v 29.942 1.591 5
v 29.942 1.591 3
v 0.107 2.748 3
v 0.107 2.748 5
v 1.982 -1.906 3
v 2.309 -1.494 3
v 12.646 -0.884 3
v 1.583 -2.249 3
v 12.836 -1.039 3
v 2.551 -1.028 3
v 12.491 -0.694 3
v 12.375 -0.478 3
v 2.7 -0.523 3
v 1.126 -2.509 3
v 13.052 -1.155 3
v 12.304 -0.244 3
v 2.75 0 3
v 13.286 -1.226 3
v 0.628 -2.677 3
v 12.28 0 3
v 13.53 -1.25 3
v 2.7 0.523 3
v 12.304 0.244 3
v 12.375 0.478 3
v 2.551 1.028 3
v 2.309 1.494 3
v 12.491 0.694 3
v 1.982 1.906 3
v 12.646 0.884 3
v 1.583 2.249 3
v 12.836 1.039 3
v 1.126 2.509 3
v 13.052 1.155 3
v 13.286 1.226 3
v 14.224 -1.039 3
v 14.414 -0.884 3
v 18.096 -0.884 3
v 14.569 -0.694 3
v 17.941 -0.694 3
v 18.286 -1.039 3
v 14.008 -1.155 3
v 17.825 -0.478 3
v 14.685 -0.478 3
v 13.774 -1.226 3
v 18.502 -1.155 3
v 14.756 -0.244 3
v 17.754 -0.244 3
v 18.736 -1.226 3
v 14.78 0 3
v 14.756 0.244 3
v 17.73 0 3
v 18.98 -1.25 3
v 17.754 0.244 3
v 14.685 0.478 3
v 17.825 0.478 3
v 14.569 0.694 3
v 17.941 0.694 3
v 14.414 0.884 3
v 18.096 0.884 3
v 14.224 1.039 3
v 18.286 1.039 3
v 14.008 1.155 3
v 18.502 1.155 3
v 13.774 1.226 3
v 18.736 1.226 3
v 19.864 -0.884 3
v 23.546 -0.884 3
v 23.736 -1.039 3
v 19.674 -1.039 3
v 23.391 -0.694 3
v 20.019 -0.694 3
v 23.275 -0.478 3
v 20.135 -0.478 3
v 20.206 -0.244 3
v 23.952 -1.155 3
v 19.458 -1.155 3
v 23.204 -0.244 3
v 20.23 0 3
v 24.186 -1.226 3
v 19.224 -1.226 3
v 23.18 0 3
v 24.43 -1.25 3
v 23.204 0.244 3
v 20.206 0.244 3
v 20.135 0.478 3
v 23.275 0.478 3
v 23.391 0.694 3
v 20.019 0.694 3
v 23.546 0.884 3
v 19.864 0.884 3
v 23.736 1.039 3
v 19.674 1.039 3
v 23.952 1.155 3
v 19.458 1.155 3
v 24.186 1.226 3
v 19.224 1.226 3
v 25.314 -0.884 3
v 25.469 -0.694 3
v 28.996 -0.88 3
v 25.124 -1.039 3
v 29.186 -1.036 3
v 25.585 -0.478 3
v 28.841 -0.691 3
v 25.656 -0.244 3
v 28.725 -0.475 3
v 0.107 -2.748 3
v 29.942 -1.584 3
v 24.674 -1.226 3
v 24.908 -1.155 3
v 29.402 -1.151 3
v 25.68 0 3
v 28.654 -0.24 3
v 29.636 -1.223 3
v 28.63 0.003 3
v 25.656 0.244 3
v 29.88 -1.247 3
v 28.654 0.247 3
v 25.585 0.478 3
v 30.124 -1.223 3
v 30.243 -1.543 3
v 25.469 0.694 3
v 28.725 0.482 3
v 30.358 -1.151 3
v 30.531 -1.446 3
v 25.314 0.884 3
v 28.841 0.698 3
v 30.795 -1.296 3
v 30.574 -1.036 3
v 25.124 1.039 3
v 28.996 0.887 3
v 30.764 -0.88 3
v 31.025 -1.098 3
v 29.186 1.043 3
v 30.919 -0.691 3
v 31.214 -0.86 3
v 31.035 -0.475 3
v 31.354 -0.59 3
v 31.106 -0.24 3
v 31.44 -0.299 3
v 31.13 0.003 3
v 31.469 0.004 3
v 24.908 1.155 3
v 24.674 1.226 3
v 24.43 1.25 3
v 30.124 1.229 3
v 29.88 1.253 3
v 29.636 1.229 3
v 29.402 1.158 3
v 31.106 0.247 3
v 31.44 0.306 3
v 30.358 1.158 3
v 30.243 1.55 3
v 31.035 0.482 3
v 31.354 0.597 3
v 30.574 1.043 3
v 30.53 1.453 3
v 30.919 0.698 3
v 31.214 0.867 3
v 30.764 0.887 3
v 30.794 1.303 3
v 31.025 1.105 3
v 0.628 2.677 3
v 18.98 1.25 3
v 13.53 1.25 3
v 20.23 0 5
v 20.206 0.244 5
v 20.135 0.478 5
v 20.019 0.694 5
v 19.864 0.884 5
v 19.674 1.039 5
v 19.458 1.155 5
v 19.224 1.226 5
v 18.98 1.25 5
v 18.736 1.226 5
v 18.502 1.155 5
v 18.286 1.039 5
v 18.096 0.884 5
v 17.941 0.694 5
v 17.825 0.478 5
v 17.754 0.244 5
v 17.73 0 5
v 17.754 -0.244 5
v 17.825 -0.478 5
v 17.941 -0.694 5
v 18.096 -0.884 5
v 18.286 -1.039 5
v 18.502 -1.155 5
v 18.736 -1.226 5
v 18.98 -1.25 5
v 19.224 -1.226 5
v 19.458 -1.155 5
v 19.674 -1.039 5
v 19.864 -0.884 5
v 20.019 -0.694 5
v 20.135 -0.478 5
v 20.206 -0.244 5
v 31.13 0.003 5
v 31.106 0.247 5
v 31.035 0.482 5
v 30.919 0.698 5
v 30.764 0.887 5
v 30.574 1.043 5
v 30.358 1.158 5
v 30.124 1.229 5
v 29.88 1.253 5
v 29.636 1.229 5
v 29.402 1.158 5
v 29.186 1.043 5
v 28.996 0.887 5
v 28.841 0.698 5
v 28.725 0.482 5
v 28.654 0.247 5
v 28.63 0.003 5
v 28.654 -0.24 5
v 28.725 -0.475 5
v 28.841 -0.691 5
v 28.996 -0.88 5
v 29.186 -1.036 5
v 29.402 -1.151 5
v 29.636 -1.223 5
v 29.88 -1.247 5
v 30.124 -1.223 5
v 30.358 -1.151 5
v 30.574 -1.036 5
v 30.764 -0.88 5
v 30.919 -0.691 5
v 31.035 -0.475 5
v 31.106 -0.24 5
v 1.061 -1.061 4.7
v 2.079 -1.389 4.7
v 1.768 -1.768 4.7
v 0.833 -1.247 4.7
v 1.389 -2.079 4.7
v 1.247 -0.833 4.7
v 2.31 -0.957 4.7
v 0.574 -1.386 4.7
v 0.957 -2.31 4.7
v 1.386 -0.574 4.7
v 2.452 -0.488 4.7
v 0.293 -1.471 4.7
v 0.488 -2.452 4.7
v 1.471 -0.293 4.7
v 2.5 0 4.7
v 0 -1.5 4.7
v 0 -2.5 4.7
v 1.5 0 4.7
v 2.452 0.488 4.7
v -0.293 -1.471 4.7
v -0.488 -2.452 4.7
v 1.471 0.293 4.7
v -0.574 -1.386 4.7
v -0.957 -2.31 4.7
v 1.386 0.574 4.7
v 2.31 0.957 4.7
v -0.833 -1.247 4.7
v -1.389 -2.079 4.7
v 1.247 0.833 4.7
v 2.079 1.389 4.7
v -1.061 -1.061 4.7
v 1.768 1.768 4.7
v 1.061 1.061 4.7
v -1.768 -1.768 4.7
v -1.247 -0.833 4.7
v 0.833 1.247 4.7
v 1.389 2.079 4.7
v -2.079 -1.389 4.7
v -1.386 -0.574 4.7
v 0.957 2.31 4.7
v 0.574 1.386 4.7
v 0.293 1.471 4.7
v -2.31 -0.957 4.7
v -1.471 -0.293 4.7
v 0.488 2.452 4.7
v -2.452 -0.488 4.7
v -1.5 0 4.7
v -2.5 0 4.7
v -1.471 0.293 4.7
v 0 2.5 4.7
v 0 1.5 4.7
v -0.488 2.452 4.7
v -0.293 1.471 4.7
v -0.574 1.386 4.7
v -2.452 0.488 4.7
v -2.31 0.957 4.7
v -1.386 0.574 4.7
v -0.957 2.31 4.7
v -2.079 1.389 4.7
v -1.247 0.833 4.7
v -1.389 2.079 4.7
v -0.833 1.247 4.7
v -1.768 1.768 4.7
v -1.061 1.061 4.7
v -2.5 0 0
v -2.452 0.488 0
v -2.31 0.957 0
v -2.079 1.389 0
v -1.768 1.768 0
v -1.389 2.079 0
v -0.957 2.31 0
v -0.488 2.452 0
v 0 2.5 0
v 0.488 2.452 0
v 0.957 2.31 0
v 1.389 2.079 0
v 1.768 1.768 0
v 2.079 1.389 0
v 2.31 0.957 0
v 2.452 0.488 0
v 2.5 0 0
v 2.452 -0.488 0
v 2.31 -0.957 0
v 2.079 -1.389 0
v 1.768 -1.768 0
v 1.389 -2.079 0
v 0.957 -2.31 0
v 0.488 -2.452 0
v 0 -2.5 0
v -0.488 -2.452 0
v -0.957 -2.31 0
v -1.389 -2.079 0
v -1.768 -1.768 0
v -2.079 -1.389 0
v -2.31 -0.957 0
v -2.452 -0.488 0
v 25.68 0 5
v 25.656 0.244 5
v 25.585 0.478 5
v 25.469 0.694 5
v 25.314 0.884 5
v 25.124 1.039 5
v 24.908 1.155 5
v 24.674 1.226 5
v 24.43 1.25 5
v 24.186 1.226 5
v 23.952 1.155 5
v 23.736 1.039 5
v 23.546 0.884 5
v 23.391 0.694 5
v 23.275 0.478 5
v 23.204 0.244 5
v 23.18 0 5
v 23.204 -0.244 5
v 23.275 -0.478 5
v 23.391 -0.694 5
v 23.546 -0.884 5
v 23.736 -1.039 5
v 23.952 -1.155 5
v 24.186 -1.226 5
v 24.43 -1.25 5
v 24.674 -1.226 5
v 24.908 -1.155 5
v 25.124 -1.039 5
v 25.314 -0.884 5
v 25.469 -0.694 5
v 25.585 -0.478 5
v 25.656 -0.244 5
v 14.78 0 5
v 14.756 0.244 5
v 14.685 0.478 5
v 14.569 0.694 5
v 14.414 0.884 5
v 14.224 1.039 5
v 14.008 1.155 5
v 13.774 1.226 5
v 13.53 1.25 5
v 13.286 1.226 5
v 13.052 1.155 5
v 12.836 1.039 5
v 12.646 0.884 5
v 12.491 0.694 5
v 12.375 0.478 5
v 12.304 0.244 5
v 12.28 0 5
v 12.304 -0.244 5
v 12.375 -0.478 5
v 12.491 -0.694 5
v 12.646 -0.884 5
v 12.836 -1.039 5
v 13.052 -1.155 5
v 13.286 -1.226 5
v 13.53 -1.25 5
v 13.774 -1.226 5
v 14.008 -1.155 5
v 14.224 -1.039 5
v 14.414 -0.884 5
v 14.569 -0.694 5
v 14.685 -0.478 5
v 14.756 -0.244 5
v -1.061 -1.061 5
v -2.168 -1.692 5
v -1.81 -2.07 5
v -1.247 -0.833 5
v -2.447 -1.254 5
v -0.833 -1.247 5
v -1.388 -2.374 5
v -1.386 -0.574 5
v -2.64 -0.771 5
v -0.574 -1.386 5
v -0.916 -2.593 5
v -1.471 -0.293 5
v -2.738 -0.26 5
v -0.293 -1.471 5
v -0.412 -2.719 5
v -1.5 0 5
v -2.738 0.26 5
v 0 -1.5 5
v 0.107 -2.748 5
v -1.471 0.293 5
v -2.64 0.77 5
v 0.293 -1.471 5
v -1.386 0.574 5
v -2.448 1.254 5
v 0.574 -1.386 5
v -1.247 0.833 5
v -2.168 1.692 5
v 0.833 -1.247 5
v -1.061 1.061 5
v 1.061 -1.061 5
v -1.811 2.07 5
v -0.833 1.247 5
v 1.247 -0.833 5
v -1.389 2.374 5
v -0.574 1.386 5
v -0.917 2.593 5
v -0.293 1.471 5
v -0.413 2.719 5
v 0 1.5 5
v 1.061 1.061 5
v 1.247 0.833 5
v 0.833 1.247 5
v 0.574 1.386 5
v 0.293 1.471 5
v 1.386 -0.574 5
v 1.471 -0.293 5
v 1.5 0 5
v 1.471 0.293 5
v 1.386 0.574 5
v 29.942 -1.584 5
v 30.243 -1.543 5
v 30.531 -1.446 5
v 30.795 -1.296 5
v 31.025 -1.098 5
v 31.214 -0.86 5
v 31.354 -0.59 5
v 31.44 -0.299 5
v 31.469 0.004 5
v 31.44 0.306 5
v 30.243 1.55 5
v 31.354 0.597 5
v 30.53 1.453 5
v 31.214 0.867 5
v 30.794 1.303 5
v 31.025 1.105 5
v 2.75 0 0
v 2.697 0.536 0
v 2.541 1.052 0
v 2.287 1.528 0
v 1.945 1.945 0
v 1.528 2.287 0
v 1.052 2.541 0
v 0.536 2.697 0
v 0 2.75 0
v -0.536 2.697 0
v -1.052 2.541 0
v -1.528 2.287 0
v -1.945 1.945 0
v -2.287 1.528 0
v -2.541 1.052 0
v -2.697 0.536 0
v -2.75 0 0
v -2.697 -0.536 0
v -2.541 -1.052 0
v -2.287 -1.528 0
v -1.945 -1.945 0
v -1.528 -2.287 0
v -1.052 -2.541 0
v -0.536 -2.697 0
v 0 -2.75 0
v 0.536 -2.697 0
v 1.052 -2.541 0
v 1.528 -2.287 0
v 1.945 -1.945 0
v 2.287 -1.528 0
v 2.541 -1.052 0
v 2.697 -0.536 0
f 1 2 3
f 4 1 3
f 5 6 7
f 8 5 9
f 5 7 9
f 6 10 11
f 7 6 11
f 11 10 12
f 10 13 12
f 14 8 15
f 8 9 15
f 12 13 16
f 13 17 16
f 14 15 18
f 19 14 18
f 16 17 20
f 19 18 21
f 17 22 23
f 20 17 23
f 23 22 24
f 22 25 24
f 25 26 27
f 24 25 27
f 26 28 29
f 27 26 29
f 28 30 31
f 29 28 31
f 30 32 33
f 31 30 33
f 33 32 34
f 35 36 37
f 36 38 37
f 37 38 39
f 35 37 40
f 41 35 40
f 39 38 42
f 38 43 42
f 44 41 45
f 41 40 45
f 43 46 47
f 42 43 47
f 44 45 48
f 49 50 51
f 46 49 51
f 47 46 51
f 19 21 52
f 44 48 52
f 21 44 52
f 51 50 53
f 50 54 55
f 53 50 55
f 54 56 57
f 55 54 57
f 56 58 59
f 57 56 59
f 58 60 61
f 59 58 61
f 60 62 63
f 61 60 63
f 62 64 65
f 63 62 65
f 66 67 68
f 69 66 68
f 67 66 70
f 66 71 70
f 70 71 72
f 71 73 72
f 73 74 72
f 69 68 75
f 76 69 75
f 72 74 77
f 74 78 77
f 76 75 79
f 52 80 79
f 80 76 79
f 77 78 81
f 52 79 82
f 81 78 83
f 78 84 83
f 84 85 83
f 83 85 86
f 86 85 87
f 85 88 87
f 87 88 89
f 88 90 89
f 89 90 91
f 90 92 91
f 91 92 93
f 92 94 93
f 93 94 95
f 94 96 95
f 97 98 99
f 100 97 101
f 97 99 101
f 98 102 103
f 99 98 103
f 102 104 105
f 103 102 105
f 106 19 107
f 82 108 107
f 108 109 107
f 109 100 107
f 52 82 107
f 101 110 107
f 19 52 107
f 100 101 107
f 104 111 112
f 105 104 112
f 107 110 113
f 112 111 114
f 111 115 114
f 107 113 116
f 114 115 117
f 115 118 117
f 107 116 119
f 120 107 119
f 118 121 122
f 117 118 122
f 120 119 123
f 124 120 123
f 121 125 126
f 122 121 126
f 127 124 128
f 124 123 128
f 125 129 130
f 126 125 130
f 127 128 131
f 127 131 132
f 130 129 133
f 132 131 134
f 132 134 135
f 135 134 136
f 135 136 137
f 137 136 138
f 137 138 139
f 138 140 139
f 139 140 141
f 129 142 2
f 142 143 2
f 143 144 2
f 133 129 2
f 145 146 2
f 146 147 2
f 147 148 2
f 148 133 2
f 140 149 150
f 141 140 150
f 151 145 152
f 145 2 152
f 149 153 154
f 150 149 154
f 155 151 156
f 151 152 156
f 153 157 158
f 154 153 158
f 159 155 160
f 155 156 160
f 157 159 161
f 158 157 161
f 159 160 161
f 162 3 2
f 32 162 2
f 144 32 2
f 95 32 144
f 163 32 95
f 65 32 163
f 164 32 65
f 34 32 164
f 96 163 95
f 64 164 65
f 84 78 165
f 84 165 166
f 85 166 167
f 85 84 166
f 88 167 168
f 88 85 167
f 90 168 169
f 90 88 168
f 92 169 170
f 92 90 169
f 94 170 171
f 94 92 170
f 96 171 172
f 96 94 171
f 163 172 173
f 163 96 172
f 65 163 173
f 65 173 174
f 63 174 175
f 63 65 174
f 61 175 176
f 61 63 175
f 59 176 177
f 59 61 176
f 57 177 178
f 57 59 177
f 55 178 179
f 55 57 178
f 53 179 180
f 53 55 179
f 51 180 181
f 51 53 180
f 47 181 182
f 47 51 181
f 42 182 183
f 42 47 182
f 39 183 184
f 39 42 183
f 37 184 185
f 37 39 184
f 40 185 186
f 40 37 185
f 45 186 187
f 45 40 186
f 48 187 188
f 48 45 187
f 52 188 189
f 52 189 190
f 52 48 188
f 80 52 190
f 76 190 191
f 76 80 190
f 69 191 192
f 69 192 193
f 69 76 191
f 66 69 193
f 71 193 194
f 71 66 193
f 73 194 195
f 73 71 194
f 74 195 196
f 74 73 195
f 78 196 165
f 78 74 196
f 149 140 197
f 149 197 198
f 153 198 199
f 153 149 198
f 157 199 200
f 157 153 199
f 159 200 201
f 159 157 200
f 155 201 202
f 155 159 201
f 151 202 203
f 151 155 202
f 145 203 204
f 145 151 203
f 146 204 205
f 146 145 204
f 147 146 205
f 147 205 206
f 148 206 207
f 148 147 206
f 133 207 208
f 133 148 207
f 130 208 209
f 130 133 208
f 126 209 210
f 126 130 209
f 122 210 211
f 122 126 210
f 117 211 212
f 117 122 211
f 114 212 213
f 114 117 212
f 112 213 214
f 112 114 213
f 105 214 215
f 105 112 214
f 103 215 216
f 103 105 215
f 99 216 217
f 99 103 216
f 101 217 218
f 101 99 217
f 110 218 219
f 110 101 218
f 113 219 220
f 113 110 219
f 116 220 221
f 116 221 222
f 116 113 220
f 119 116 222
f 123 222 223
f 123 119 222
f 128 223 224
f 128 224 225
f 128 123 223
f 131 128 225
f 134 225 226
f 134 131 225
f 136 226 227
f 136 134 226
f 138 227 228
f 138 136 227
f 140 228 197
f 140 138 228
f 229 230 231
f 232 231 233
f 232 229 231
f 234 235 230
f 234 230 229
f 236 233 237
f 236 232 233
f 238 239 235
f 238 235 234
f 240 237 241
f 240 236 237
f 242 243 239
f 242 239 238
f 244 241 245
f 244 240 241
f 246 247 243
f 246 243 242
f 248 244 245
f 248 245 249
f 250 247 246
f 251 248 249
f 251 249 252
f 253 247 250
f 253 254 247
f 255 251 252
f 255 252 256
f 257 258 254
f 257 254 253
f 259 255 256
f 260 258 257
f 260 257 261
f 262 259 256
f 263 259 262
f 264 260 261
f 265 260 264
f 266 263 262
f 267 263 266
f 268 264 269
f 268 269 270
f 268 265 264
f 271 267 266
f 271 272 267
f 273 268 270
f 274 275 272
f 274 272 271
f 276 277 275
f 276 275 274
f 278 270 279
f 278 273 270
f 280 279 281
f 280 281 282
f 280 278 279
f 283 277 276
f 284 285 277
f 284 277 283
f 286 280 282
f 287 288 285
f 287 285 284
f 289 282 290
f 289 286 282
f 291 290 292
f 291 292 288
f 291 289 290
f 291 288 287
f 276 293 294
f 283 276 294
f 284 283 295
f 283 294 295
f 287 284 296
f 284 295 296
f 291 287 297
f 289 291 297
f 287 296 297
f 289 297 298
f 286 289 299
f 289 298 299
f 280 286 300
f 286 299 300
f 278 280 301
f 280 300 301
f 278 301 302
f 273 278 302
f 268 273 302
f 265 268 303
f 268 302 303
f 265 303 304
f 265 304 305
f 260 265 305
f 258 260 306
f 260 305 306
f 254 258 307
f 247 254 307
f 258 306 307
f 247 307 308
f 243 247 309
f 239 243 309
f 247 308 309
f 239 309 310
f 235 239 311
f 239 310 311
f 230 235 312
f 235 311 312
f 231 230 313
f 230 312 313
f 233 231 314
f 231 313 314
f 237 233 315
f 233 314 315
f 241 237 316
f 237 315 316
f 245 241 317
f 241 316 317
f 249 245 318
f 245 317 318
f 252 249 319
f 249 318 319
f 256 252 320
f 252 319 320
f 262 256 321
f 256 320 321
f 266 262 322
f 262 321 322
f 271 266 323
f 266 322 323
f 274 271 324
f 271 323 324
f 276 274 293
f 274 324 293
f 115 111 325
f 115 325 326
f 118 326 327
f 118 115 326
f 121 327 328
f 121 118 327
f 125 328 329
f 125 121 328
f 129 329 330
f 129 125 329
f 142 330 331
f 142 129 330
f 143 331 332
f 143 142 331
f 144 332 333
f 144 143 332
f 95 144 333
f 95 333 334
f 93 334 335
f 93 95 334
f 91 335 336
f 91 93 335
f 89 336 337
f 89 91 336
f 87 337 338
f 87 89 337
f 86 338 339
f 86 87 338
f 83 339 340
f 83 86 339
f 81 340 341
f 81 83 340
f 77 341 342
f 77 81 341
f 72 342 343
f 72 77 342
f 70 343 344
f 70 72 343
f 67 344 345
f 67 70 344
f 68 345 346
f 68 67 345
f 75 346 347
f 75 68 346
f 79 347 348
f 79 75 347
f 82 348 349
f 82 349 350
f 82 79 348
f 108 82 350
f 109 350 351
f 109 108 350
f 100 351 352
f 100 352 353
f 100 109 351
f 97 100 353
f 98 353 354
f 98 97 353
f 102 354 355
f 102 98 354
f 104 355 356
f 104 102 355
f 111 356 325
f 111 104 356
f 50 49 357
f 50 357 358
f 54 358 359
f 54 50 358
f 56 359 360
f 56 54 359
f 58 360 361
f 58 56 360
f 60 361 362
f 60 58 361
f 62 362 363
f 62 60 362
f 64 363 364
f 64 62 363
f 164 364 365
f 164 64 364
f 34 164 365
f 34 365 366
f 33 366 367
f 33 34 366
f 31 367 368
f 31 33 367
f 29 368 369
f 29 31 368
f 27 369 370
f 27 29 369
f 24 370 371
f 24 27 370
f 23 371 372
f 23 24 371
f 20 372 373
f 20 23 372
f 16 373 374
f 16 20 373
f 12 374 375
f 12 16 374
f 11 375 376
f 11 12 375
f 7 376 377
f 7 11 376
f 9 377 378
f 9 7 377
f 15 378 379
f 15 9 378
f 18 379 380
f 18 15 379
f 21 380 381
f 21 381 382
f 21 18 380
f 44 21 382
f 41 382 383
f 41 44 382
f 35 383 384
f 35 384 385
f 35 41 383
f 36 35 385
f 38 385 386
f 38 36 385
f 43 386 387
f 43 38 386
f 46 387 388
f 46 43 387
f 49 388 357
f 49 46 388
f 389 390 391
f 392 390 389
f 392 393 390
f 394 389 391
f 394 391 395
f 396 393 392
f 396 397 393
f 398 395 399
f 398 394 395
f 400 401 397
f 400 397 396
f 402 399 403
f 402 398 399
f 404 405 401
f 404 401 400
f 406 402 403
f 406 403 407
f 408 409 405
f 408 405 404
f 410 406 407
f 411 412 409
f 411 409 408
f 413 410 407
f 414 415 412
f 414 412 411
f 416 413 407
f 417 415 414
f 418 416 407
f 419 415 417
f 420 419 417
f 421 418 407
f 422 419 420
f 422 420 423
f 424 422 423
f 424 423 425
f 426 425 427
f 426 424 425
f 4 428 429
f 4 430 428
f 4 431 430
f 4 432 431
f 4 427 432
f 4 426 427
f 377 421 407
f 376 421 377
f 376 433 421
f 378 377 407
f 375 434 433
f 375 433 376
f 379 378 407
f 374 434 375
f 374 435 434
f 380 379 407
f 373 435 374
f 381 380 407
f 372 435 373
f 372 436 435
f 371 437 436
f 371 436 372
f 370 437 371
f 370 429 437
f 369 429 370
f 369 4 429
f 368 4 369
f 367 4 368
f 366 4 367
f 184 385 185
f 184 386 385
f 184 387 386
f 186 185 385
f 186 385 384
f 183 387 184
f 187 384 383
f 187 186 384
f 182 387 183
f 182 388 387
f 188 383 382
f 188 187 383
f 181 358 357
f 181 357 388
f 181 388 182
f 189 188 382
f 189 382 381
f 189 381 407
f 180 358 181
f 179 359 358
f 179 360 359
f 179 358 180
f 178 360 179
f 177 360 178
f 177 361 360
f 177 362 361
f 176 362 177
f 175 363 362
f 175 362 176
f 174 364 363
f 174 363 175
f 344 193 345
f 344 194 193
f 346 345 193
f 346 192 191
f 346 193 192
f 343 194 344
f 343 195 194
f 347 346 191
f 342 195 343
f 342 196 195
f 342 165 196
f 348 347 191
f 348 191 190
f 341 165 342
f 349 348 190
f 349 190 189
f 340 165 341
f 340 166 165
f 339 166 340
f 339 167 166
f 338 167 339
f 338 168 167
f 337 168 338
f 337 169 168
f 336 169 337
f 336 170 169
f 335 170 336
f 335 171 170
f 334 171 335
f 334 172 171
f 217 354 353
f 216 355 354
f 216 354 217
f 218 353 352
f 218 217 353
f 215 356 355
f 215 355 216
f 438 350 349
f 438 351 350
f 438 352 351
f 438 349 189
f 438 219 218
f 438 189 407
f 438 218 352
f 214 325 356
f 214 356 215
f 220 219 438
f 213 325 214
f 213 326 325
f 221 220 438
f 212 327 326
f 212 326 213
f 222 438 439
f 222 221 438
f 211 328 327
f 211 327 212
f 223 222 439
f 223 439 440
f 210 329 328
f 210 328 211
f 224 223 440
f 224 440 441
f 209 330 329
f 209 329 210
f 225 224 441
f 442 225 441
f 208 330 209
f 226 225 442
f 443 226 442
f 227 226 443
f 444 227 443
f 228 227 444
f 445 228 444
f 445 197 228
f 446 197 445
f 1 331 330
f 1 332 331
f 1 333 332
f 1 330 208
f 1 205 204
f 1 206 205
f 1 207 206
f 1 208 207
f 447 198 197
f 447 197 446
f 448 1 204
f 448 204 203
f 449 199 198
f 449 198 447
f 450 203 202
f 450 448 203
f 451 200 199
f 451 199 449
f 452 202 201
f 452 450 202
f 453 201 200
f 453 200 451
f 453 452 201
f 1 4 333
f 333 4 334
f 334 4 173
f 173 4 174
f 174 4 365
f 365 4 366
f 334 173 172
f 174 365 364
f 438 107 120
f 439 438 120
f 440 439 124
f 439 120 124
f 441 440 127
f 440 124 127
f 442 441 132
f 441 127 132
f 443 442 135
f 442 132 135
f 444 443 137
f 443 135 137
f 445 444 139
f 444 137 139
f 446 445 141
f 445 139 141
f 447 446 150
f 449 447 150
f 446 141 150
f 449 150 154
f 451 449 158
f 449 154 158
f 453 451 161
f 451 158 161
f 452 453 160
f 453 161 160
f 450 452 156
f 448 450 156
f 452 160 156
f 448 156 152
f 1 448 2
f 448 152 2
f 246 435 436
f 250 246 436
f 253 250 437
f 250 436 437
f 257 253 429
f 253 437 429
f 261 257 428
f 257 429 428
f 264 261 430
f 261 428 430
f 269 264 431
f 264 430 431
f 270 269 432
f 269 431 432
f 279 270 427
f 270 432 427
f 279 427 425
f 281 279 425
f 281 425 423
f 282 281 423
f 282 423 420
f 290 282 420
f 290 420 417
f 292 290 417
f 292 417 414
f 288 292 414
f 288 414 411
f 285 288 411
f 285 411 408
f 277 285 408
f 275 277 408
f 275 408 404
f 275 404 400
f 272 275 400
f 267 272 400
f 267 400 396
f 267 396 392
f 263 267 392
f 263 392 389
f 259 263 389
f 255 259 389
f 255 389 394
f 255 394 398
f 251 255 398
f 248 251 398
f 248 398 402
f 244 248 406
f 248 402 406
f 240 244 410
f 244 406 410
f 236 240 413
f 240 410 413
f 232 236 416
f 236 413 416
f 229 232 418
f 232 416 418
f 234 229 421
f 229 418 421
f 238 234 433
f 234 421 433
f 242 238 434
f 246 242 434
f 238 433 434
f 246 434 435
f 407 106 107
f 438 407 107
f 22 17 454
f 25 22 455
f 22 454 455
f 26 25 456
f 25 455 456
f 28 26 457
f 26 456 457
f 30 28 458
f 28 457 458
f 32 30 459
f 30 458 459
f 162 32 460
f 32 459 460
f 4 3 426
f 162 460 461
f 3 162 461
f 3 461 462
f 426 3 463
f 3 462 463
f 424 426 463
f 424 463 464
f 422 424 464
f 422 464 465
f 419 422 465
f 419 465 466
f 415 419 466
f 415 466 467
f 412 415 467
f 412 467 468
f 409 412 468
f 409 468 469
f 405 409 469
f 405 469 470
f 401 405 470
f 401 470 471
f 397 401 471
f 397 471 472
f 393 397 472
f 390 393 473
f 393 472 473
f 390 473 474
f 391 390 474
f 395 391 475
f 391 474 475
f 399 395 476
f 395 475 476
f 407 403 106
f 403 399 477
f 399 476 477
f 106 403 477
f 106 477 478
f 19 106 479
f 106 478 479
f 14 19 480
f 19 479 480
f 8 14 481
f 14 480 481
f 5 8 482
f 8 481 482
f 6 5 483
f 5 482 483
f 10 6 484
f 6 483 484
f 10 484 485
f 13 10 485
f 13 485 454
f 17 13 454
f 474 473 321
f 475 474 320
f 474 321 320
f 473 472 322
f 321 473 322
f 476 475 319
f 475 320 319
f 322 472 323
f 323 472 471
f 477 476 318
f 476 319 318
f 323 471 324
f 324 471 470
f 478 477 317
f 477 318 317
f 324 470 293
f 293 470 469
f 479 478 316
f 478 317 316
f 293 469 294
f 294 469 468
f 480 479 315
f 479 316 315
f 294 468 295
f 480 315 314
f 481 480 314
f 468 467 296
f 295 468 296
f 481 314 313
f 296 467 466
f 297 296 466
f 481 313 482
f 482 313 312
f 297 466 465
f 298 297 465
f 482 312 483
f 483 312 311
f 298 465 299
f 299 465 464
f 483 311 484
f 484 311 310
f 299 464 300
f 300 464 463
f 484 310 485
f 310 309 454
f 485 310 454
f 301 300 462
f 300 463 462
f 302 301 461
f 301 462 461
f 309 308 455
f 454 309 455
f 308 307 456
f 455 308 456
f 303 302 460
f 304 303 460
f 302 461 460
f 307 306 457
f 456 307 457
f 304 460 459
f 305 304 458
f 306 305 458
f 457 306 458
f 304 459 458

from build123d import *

# Parameters (mm, degrees)
SKETCH_1_R          = 2.75
EXTRUDE_1_DEPTH     = 5
SKETCH_2_R          = 2.5
CUT_EXTRUDE_1_DEPTH = 4.7
SKETCH_3_R          = 1.5
CUT_EXTRUDE_2_DEPTH = 4.7
EXTRUDE_START       = -2
SKETCH_4_R          = 1.25
EXTRUDE_3_DEPTH     = 2


with BuildPart() as part:
    # 草图1 → 凸台-拉伸1 (new body)
    with BuildSketch(Plane.XY):
        Circle(SKETCH_1_R)
    extrude(amount=EXTRUDE_1_DEPTH)

    # 草图2 → 切除-拉伸1 (cut)
    with BuildSketch(Plane(origin=(0, 0, 0), x_dir=(-1, 0, 0), z_dir=(0, 0, -1))):
        Circle(SKETCH_2_R)
    extrude(amount=-CUT_EXTRUDE_1_DEPTH, mode=Mode.SUBTRACT)

    # 草图3 → 切除-拉伸2 (cut)
    with BuildSketch(Plane.XY.offset(5)):
        Circle(SKETCH_3_R)
    extrude(amount=-CUT_EXTRUDE_2_DEPTH, mode=Mode.SUBTRACT)

    # 草图4 → 凸台-拉伸3 (add)
    with BuildSketch(Plane.XY.offset(5).offset(EXTRUDE_START)):
        with BuildLine():
            Line((29.941561076, 1.591009855), (0.106557862, 2.747934756))
            ThreePointArc((0.106557862, 2.747934756), (1.981859495, 1.906497558), (2.75, 0))
            ThreePointArc((2.75, 0), (1.982079977, -1.906268335), (0.10719348, -2.747910035))
            Line((0.10719348, -2.747910035), (29.94192829, -1.584084071))
            ThreePointArc((29.94192829, -1.584084071), (31.46874704, 0.003639496), (29.941561076, 1.591009855))
        make_face()
        with Locations((13.53, 0)):
            Circle(SKETCH_4_R, mode=Mode.SUBTRACT)
        with Locations((18.98, 0)):
            Circle(SKETCH_4_R, mode=Mode.SUBTRACT)
        with Locations((24.43, 0)):
            Circle(SKETCH_4_R, mode=Mode.SUBTRACT)
        with Locations((29.8799998, 0.003455751)):
            Circle(SKETCH_4_R, mode=Mode.SUBTRACT)
    extrude(amount=EXTRUDE_3_DEPTH)


solid = part.part
